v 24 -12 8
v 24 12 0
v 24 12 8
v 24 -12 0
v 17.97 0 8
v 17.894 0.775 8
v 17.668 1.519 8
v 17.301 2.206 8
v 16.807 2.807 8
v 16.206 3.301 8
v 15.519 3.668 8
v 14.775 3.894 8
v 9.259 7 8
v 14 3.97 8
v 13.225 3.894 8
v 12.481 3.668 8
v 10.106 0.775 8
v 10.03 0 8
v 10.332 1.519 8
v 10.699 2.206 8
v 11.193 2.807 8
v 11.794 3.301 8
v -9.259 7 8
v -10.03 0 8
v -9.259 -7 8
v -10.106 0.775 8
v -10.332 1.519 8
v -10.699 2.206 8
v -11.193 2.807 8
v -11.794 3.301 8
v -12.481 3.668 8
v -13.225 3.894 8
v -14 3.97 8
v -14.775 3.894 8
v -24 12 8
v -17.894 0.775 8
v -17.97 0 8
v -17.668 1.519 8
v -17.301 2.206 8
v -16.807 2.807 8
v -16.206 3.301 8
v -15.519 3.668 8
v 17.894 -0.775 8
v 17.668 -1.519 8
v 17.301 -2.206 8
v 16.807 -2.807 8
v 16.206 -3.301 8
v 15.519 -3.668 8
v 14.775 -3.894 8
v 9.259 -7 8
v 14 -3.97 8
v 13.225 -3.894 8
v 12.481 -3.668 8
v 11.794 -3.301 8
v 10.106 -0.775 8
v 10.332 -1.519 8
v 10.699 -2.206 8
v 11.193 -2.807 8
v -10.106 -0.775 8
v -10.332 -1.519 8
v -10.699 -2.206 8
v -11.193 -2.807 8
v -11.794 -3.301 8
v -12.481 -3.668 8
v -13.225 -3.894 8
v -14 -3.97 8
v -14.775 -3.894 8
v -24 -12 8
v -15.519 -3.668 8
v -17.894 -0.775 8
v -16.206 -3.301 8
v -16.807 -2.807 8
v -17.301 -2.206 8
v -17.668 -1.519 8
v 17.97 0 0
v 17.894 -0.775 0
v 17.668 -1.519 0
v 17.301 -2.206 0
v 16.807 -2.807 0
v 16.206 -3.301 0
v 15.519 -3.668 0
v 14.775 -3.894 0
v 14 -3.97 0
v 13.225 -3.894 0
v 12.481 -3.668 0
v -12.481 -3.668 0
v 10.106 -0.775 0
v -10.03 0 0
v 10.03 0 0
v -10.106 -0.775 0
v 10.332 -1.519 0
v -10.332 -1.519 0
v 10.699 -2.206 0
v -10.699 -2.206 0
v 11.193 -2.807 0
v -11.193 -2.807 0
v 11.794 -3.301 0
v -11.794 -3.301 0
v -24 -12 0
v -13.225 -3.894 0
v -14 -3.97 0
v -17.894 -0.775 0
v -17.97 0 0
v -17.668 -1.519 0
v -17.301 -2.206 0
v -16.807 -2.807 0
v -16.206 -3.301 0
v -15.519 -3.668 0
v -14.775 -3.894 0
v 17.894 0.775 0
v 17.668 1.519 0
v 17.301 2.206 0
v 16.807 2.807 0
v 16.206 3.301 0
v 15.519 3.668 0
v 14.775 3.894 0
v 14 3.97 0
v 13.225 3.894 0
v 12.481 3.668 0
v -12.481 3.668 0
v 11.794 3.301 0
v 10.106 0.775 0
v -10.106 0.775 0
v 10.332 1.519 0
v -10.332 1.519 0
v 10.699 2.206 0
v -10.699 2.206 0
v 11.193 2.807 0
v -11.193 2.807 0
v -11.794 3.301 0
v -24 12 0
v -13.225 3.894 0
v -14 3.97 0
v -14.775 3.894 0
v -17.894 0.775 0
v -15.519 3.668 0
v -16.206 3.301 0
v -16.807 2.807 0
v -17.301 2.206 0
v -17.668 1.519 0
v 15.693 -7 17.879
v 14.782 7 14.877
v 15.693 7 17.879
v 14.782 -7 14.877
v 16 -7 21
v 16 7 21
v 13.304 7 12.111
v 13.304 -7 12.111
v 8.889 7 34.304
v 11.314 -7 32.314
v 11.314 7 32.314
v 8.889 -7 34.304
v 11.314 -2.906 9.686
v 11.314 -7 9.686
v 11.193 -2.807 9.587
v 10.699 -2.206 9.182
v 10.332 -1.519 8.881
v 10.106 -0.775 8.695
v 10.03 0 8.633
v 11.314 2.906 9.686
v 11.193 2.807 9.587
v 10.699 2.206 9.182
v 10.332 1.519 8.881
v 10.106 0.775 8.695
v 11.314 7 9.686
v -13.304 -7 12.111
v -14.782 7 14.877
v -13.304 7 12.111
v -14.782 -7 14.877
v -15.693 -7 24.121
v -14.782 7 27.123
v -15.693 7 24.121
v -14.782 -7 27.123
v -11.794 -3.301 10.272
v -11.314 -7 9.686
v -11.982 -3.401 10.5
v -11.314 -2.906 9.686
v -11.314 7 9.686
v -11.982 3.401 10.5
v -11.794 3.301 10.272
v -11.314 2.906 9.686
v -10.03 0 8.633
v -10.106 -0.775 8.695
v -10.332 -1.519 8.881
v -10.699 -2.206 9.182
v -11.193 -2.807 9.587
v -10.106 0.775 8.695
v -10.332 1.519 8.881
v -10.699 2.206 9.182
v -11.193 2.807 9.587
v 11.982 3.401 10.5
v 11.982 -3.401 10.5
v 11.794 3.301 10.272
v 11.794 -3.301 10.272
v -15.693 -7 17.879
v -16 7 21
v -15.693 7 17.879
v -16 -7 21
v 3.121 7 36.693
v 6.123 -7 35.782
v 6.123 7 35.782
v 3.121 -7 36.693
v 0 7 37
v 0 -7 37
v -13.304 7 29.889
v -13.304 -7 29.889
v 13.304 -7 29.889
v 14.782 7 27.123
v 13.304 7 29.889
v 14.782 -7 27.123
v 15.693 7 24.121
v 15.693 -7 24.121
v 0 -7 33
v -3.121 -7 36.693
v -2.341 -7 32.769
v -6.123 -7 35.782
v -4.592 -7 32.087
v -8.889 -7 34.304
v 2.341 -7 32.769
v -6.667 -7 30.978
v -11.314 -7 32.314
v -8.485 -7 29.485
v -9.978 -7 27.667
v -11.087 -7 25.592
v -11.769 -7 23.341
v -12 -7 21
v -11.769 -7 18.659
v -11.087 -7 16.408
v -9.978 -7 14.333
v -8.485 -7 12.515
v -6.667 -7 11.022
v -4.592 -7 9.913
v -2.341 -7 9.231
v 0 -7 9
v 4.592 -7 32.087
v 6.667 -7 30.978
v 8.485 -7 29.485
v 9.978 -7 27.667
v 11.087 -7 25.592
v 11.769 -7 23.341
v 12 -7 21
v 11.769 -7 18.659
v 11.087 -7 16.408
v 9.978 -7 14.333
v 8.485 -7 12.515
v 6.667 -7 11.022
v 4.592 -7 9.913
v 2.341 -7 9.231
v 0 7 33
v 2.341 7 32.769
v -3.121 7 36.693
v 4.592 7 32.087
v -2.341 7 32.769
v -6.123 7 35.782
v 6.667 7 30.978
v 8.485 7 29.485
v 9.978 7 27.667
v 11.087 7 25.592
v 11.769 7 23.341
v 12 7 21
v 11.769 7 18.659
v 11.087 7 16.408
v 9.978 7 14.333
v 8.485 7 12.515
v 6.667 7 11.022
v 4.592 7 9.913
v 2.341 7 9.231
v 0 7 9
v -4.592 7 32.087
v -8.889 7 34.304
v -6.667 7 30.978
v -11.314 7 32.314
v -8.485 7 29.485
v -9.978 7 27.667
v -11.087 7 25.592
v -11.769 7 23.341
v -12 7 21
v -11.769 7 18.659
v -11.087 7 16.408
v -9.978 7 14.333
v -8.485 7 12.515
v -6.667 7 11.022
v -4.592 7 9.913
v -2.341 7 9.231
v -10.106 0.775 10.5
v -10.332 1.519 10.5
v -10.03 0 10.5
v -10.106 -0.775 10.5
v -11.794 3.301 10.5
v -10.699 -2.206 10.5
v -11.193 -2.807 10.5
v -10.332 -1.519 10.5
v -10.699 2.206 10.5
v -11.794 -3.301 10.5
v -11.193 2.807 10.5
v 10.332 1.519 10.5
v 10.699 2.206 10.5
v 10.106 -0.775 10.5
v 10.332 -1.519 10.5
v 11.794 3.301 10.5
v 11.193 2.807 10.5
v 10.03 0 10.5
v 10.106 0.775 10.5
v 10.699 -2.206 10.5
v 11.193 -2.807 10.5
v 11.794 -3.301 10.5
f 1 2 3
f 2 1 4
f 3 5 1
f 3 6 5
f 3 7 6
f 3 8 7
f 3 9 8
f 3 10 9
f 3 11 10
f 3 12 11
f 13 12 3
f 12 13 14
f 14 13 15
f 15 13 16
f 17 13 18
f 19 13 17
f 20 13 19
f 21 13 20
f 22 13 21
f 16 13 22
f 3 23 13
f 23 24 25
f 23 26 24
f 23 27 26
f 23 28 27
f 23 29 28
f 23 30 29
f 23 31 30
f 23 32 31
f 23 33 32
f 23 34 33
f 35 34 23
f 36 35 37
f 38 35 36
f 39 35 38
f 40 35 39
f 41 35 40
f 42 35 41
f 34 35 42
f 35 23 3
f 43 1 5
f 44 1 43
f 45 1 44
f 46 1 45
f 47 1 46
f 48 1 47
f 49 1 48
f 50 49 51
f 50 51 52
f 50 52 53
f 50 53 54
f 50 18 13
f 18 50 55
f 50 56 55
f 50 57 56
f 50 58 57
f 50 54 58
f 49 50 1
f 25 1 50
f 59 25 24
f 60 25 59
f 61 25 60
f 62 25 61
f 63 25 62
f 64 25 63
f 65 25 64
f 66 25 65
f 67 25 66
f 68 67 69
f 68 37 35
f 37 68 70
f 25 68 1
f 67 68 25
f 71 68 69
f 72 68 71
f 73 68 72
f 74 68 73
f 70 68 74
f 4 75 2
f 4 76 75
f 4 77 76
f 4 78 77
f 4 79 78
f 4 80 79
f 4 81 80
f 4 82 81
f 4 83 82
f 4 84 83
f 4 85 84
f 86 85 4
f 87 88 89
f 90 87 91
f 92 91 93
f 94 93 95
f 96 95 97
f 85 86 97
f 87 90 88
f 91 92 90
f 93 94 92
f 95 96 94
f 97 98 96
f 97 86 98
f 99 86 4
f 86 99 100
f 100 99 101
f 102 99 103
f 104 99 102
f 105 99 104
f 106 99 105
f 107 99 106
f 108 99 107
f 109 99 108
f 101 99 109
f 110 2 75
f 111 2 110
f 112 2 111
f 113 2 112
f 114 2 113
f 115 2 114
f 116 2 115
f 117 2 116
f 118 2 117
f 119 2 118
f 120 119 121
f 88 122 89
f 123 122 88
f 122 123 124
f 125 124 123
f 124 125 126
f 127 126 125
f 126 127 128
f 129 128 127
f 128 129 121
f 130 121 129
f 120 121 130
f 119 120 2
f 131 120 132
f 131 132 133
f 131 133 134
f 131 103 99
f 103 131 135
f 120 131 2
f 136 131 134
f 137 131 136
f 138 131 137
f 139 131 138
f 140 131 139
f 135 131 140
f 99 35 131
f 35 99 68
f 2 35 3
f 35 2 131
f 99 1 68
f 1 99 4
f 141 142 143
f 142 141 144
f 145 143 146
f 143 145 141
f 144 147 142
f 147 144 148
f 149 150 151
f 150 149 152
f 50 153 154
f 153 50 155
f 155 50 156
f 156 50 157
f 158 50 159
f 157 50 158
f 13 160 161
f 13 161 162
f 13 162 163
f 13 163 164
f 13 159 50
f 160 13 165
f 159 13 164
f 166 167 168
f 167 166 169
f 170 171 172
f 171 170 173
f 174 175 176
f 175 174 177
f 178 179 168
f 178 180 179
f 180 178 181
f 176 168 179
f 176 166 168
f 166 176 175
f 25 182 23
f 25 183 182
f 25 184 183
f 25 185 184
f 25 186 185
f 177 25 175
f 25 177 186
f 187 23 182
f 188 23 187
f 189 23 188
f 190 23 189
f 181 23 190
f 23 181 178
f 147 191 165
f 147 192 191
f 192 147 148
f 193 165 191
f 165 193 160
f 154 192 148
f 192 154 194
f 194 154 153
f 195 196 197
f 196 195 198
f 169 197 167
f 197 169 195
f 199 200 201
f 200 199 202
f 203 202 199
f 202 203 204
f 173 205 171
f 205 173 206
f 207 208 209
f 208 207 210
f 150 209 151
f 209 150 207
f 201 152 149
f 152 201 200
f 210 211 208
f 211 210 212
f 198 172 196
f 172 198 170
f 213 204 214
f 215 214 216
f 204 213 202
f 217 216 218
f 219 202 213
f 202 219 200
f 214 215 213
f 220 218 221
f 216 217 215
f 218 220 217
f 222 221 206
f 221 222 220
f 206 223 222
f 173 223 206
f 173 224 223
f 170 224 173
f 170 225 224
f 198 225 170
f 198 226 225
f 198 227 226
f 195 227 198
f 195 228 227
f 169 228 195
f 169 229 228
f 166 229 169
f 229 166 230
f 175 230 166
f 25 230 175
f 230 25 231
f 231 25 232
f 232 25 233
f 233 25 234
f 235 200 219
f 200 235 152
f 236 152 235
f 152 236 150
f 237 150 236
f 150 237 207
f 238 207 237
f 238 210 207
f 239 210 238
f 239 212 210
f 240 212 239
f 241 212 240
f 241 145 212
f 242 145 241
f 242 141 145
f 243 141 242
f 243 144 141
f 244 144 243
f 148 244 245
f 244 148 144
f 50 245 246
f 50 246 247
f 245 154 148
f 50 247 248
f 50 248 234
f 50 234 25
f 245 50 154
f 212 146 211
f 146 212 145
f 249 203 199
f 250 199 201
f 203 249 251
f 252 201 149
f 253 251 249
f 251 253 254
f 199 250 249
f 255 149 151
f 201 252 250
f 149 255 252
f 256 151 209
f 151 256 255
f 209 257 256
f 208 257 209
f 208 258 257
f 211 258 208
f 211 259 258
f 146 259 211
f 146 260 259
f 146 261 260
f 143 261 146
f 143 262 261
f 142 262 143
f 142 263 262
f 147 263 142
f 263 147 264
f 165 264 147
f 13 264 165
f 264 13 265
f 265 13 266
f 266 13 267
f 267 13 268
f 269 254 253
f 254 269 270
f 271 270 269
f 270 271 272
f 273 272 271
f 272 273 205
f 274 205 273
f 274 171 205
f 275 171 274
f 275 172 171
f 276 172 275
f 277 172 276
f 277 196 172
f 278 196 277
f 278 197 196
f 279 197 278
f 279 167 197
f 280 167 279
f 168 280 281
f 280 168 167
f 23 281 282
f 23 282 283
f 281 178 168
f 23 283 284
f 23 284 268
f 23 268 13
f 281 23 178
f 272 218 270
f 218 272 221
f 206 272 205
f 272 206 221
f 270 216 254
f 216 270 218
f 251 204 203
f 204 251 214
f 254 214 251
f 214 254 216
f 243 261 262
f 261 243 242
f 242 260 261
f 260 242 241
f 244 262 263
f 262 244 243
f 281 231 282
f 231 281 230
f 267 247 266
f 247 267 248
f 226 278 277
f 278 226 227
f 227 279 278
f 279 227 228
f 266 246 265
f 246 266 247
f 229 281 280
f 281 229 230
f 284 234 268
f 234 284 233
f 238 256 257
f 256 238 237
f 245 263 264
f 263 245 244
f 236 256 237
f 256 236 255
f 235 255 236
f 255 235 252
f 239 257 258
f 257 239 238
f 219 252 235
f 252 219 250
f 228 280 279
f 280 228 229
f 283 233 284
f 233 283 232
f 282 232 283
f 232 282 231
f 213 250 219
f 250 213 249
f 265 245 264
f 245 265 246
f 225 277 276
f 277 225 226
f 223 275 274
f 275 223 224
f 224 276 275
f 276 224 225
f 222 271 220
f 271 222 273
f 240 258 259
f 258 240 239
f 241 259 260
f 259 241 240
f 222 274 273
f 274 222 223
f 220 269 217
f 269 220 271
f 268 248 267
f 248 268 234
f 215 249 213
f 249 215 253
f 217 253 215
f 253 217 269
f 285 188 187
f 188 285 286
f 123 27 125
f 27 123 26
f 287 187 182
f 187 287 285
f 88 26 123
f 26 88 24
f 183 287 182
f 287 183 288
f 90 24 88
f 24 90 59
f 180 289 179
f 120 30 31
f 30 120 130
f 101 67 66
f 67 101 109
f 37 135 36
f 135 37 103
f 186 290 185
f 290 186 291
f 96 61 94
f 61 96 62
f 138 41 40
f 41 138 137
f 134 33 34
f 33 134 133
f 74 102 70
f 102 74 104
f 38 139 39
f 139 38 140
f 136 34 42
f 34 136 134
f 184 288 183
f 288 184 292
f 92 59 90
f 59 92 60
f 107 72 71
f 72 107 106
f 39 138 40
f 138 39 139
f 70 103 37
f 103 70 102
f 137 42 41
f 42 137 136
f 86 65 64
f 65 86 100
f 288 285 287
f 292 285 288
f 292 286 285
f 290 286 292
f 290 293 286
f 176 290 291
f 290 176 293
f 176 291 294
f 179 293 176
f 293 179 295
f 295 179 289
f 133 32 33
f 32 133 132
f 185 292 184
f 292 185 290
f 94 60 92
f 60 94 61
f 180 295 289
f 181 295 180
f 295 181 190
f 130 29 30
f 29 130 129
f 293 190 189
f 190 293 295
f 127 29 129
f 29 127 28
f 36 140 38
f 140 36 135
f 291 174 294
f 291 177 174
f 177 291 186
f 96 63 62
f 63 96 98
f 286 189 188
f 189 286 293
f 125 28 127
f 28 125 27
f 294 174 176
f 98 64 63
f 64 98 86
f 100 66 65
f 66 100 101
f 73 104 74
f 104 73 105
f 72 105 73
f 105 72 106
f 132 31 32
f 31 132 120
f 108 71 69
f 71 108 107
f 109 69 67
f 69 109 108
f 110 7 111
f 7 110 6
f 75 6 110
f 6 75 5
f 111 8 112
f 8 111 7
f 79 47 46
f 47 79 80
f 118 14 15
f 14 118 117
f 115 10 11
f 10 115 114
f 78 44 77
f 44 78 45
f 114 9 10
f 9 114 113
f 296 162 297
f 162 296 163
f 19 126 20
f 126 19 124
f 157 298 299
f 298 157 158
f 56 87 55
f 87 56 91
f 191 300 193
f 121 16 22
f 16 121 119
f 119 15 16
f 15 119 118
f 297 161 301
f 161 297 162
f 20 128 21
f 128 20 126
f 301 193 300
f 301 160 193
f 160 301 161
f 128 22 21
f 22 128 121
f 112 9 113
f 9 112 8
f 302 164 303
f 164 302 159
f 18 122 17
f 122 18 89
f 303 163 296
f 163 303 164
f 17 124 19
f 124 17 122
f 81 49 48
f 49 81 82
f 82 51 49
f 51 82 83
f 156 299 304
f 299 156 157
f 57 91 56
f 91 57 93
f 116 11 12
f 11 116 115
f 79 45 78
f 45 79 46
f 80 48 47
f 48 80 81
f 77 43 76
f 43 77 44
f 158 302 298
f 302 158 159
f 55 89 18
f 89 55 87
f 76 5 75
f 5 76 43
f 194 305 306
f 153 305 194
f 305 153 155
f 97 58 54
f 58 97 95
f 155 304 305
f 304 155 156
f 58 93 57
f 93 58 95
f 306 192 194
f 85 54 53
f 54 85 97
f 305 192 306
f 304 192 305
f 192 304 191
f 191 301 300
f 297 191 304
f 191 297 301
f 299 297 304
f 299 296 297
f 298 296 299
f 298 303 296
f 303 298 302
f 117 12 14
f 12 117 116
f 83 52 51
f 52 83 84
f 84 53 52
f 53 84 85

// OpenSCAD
$fn = 32;

// ----------------------------------------------------------------------
// Deck eye: 32 mm eye on a 48 mm base
// ----------------------------------------------------------------------

// --- parameters (mm) ---
base_l = 48;              // base length
base_w = 24;              // base width
base_t = 8;               // base thickness
eye_r = 16;               // eye outside radius
eye_bore = 24;            // eye bore diameter
eye_w = 14;               // eye thickness
eye_z = 21;               // eye centre height
holes_d = 7.94;           // fixing holes
hole_x = 14;              // fixing hole spacing

difference() {
  union() {
    translate([-24, -12, 0]) cube([base_l, base_w, base_t]);
    /* eye standing upright, its foot sunk 3 mm into the base */
    translate([0, -7, 21]) rotate([-90, 0, 0]) cylinder(h = 14, d = 32);
  }
  /* eye bore, 2.5 mm clear of both faces */
  translate([0, -9.5, 21]) rotate([-90, 0, 0]) cylinder(h = 19, d = 24);
  translate([-14, 0, -2.5]) cylinder(h = base_t + 5, d = holes_d);
  translate([14, 0, -2.5]) cylinder(h = base_t + 5, d = holes_d);
}
